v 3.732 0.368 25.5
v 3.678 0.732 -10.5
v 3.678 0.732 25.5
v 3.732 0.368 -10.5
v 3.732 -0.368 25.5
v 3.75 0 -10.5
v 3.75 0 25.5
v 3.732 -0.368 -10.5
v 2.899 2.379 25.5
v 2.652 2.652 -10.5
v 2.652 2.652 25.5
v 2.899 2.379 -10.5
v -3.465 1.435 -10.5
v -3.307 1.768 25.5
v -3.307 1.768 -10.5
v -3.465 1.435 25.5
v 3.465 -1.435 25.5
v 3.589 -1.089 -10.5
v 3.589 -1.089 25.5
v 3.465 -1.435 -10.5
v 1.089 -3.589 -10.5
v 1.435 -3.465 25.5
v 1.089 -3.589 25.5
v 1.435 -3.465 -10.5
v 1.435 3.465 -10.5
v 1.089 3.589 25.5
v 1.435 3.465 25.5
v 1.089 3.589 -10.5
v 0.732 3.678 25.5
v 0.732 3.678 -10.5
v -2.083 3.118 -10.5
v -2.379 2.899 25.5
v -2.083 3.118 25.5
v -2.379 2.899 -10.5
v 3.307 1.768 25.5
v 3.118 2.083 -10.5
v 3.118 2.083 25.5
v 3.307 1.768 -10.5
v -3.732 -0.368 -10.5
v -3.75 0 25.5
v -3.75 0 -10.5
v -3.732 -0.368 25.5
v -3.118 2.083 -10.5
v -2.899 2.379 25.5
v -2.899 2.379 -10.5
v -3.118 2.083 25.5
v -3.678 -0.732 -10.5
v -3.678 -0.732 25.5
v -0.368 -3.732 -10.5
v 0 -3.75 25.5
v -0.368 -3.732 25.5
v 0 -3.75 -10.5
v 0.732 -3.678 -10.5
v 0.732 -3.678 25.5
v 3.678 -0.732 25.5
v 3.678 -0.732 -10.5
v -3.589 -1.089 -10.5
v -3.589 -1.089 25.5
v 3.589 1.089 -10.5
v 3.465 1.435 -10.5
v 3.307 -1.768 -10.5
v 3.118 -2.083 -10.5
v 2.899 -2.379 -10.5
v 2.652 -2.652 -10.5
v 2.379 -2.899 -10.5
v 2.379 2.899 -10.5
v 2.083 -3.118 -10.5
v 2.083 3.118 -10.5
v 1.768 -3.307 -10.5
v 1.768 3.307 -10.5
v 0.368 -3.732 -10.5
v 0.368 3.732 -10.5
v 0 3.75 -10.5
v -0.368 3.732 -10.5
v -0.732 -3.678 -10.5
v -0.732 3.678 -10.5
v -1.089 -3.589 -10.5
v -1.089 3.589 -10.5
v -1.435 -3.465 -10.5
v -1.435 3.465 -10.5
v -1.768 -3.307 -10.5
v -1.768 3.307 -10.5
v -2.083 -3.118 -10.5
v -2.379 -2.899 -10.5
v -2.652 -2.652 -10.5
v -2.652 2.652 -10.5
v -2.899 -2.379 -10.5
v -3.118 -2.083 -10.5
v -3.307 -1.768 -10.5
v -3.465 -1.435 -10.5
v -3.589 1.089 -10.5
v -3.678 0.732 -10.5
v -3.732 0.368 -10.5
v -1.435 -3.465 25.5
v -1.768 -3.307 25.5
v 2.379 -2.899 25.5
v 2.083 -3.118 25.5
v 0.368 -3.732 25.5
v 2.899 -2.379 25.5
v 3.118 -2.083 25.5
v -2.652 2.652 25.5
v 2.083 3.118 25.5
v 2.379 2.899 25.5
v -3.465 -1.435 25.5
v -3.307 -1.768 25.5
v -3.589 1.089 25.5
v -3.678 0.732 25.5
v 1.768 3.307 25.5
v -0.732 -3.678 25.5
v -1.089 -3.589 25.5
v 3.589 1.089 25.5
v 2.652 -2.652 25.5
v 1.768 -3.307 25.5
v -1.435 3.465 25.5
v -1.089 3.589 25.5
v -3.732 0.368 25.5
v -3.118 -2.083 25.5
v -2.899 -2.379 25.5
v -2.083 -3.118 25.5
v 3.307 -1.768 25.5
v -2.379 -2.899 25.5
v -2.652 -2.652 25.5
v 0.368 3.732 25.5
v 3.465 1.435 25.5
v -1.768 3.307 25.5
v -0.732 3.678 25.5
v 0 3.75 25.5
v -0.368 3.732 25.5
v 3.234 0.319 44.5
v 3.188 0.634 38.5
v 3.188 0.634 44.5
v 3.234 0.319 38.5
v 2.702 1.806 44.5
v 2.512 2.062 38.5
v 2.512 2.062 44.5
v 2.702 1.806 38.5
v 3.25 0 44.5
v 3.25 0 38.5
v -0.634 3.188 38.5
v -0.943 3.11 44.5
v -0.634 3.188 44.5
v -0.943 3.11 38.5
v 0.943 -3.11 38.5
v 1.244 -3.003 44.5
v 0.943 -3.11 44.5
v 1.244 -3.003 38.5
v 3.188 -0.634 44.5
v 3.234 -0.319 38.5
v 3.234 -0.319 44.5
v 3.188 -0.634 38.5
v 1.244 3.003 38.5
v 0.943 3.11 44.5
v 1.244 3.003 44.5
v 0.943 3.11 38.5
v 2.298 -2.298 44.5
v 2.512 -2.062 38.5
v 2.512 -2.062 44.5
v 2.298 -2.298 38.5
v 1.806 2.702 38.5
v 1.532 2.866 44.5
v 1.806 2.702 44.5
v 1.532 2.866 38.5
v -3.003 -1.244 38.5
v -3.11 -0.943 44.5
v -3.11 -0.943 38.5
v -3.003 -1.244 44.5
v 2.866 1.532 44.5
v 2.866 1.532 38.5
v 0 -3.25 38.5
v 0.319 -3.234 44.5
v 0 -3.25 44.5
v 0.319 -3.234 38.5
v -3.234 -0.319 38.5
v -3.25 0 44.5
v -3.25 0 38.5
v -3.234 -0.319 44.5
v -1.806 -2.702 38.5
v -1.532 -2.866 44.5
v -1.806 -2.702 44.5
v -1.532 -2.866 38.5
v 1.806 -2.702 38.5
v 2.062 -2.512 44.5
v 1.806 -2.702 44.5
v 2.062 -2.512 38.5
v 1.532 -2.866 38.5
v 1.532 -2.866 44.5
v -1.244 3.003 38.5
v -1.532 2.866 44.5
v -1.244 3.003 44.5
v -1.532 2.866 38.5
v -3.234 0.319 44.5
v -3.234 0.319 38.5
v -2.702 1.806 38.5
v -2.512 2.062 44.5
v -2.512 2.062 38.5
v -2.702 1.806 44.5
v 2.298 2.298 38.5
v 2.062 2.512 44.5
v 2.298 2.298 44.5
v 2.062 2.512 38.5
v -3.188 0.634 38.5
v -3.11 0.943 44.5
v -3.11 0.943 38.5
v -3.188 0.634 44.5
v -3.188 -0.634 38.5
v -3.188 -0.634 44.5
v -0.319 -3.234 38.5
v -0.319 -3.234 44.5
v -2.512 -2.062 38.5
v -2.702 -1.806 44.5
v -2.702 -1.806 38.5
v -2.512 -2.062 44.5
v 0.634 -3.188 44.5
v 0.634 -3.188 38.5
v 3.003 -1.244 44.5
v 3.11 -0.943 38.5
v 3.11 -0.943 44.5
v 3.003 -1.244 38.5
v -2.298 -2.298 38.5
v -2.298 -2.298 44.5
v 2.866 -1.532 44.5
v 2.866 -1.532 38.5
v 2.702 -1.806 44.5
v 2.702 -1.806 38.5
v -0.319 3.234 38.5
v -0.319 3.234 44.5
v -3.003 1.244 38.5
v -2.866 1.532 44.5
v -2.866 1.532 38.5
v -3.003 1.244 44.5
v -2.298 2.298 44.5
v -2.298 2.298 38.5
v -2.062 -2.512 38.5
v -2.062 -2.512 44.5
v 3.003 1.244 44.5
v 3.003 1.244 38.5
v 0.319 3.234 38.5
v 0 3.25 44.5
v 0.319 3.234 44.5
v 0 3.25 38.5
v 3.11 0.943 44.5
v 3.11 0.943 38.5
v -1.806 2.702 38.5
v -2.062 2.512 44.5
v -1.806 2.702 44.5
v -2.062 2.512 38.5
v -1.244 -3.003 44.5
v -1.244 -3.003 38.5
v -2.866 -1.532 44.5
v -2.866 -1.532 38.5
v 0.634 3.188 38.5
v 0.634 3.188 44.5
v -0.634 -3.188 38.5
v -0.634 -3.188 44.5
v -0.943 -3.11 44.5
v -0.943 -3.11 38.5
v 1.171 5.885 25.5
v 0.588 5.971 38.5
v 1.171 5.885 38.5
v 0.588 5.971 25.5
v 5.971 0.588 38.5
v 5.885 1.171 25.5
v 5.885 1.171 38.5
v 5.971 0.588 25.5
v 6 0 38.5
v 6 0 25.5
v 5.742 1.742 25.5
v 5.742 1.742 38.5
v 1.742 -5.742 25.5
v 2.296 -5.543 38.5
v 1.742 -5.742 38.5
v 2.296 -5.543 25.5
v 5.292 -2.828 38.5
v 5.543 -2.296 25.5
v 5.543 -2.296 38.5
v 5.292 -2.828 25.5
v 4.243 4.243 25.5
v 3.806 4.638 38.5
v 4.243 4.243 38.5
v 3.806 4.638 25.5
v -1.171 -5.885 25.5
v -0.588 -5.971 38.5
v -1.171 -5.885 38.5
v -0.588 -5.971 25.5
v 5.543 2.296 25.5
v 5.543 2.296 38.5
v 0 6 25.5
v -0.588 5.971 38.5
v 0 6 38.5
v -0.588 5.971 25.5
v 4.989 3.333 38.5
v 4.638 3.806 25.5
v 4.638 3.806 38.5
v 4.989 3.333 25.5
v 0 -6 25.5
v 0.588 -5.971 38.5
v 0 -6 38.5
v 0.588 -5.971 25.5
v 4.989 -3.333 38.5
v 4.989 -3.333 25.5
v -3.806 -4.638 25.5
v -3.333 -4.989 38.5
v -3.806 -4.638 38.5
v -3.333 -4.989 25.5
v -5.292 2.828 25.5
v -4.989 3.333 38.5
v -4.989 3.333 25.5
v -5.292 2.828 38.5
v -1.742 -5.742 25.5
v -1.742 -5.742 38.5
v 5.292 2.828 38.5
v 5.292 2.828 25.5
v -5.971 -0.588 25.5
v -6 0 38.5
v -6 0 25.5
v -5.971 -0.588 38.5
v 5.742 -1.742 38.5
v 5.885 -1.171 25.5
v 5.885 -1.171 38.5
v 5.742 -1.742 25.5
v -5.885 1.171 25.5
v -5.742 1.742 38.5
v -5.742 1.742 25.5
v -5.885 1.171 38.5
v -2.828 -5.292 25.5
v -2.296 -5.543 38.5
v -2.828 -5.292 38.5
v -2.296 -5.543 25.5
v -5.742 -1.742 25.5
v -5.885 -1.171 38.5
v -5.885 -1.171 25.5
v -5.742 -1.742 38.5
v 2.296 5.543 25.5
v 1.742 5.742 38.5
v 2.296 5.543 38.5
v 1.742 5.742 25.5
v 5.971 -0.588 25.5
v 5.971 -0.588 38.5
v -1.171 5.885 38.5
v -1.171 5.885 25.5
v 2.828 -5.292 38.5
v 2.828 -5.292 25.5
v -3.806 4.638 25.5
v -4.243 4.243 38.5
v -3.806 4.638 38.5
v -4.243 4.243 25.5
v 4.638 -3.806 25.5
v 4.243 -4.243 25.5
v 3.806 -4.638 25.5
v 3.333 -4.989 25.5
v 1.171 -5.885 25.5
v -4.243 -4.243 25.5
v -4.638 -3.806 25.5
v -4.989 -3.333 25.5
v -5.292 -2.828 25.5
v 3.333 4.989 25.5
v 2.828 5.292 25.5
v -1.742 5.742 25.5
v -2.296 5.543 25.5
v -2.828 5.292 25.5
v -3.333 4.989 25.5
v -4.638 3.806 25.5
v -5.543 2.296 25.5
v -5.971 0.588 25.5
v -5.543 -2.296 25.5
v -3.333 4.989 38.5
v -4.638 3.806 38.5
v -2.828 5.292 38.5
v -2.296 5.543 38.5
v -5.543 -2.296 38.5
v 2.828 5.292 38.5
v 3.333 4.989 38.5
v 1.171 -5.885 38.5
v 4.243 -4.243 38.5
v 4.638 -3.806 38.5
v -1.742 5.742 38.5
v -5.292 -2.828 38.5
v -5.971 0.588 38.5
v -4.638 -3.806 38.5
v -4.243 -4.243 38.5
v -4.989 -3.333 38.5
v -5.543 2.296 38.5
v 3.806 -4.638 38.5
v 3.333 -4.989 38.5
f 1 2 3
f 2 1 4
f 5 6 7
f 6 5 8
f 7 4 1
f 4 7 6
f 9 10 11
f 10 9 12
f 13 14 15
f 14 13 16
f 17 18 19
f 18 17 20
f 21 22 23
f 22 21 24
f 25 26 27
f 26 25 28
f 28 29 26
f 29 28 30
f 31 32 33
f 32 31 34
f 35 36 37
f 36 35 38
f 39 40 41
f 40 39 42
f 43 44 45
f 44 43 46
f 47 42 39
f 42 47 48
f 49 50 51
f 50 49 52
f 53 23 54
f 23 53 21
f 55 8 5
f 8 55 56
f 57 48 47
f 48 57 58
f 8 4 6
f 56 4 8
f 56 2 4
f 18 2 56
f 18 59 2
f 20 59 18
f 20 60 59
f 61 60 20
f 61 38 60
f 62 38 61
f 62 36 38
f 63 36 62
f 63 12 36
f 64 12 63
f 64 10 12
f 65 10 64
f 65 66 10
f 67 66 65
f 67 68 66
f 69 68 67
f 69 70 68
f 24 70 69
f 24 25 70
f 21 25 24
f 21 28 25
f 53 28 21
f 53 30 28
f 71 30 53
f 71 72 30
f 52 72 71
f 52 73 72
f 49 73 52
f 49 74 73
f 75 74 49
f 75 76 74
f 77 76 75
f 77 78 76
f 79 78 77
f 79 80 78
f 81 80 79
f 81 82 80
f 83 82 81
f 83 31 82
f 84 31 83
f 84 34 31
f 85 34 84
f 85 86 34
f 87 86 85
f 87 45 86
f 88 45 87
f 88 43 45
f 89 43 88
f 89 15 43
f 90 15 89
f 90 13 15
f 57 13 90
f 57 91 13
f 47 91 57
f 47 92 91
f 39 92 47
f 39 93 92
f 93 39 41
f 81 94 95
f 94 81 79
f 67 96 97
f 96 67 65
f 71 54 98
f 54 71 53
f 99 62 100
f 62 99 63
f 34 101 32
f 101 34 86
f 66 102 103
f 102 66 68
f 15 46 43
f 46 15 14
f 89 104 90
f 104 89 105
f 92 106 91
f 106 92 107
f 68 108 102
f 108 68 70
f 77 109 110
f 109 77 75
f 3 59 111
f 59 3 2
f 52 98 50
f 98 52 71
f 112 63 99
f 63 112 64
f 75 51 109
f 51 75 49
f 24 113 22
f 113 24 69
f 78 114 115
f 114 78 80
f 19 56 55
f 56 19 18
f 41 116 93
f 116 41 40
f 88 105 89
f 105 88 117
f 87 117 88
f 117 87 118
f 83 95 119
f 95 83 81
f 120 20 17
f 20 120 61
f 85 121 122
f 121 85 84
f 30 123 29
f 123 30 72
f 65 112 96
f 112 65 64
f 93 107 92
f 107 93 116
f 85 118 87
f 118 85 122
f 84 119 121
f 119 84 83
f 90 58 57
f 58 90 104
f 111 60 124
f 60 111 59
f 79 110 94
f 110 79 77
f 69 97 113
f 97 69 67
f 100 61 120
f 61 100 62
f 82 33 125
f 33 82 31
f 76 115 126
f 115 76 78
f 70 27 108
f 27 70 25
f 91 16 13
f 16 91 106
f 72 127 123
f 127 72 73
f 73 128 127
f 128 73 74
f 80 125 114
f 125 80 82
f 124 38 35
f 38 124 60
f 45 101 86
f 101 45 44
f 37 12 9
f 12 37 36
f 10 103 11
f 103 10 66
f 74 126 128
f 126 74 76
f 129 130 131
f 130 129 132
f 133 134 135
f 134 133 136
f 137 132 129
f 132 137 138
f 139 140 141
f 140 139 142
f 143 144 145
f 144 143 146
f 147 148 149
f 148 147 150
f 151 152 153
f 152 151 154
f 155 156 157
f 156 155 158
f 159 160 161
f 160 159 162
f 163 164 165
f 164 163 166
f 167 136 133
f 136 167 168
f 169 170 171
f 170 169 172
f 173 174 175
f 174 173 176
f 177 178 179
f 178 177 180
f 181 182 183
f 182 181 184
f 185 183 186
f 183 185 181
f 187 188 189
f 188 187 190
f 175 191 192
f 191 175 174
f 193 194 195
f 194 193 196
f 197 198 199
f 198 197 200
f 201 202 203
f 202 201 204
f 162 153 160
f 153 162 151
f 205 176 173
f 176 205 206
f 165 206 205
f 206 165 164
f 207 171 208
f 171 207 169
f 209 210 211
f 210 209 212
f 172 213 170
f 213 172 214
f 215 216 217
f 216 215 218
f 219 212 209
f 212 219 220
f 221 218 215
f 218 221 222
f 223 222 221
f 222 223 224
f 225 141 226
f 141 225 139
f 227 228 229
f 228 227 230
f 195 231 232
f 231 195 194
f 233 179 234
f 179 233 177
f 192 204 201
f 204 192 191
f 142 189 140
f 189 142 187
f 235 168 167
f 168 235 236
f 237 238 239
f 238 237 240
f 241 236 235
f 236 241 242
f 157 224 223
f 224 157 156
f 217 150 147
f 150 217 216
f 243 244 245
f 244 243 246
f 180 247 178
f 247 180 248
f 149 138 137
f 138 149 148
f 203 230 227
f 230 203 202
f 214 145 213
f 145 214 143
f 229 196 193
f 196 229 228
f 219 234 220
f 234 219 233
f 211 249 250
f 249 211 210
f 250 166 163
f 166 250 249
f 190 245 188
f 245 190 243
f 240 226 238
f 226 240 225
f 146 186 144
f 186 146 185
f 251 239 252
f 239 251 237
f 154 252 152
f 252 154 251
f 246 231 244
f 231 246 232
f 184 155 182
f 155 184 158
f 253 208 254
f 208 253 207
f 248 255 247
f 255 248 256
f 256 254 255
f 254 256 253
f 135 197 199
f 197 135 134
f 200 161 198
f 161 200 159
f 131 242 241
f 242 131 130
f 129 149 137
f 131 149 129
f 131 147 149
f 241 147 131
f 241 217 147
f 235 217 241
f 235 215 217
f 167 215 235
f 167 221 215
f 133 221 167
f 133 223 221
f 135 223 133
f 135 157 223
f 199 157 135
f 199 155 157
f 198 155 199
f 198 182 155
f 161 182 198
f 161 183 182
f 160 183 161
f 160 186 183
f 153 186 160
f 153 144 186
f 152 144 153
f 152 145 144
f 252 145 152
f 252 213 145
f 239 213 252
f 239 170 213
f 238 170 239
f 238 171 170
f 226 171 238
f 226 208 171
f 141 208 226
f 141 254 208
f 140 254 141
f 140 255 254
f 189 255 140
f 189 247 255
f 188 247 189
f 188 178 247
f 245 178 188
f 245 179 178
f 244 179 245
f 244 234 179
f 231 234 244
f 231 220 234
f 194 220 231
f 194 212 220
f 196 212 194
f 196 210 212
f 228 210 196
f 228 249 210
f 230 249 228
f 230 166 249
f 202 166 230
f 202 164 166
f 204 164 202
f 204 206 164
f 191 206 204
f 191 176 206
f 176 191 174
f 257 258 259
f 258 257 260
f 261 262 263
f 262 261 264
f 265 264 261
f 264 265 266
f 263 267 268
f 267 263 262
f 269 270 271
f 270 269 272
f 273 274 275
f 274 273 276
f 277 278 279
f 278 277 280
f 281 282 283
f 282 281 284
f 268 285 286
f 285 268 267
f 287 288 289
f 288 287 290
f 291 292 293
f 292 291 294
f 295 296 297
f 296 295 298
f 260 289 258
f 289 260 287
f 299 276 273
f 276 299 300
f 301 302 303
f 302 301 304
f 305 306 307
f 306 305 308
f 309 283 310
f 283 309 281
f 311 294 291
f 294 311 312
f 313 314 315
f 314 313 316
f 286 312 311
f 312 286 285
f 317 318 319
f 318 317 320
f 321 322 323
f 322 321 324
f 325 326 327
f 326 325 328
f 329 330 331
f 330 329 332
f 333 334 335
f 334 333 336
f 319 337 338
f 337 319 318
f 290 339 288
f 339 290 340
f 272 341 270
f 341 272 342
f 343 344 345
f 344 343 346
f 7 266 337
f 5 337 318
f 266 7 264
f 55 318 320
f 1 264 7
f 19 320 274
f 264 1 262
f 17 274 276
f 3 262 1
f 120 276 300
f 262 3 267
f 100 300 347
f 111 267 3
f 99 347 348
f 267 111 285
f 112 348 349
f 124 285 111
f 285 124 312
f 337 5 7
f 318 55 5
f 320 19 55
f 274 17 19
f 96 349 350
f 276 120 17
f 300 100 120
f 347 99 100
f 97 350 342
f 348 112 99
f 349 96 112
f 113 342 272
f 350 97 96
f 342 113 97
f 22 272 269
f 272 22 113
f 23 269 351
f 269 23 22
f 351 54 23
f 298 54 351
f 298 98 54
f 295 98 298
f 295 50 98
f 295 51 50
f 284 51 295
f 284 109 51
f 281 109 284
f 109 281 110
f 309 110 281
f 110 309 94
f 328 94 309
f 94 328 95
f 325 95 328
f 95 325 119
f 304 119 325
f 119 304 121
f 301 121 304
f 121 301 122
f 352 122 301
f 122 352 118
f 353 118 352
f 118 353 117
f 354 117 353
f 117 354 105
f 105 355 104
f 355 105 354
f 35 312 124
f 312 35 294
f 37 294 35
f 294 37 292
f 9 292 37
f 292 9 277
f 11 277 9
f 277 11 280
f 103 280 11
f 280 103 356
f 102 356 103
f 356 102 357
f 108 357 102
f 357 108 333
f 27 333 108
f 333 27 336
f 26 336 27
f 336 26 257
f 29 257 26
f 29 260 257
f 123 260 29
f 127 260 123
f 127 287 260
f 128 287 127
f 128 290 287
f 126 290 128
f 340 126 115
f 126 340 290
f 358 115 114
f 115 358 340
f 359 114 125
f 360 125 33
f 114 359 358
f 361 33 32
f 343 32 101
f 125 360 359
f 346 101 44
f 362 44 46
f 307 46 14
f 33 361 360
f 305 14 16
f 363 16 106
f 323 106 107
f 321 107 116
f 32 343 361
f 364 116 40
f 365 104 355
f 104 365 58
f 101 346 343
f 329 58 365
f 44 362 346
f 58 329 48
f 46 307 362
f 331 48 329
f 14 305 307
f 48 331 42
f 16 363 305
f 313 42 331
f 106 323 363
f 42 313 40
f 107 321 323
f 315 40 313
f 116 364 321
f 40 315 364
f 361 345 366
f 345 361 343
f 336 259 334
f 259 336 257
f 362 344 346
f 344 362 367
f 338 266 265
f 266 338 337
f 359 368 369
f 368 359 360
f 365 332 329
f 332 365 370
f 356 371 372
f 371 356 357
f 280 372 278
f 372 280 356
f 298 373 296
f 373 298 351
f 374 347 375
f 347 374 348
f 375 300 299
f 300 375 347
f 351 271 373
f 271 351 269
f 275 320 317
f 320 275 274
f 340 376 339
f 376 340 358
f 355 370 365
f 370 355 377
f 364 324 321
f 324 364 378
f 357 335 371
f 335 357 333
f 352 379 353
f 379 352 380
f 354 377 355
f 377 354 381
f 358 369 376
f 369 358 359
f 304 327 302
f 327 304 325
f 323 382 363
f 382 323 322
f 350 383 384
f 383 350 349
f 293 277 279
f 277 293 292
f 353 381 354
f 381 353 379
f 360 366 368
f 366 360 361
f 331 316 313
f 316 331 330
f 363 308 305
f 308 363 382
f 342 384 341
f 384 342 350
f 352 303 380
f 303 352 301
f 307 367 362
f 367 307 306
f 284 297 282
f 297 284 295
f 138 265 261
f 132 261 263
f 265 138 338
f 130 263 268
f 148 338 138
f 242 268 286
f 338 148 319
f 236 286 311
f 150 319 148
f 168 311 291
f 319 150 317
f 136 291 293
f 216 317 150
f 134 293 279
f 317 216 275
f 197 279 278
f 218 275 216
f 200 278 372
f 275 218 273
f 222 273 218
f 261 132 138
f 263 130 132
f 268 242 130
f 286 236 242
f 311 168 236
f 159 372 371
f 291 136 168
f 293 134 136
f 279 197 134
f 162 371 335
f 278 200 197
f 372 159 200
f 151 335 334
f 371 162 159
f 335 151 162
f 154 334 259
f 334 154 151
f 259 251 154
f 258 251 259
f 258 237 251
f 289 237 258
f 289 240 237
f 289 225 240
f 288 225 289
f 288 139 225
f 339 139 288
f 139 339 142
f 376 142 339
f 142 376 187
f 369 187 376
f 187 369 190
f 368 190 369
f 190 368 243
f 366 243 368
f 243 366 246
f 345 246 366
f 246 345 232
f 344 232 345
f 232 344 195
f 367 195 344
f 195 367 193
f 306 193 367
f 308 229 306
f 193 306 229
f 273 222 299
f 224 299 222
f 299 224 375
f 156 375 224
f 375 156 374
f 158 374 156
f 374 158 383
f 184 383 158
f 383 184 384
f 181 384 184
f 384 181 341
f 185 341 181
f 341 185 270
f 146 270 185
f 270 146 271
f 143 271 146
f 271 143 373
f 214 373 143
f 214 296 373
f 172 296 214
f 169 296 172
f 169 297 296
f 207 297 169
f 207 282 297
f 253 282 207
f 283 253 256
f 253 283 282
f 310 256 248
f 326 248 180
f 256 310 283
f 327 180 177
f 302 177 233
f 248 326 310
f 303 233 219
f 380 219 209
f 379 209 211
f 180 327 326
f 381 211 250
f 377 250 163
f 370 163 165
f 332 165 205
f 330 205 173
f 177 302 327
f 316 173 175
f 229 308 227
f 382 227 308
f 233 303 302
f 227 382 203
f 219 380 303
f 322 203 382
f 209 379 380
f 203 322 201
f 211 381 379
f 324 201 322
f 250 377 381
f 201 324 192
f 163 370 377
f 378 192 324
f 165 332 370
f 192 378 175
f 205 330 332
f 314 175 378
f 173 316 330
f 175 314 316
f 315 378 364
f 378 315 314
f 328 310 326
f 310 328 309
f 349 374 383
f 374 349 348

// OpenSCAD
// Hose-barb reducer: joins 8 mm and 5 mm silicone tubing
// Print orientation: standing upright along +Z

$fn = 64;

// ---- Dimensions (mm) ----
t1      = 8;     // larger tubing inner diameter
t2      = 5;     // smaller tubing inner diameter
bore    = 3;     // through-bore diameter
h1      = 20;    // height of first barb section (z = 0..20)
d1_bot  = 7.5;   // outer diameter of barb at bottom
d1_top  = 9.5;   // outer diameter of barb at top
c       = 12;    // collar diameter
h2      = 8;     // height of second barb section (z = 25..41)
d2_bot  = 6.5;   // outer diameter of second barb at bottom
d2_top  = 5.0;   // outer diameter of second barb at top
eps     = 0.5;   // overshoot for clean cuts

// ---- Derived ----
x1 = (d1_bot + d1_top) / 2;   // average barb diameter section 1
x2 = (d2_bot + d2_top) / 2;   // average barb diameter section 2
y1 = d1_bot - bore / 2;       // lower wall thickness section 1
y2 = d2_bot - bore / 2;       // lower wall thickness section 2

// ---- Model ----
union() {
    // Section 1: two stacked barbs for 8 mm tubing
    for (s = [-1, 1])
        translate([0, 0, s * h1 / 2 - eps])
            linear_extrude(h1 + 2 * eps)
                circle(d = d1_bot, $fn = 64);
    // Section 2: collar
    translate([0, 0, h1 + c / 2 - eps])
        cylinder(d = c, h = c + 2 * eps, $fn = 64);
    // Section 3: two stacked barbs for 5 mm tubing
    for (s = [-1, 1])
        translate([0, 0, h1 + c + s * h2 / 2 - eps])
            linear_extrude(h2 + 2 * eps)
                circle(d = d2_bot, $fn = 64);
}
